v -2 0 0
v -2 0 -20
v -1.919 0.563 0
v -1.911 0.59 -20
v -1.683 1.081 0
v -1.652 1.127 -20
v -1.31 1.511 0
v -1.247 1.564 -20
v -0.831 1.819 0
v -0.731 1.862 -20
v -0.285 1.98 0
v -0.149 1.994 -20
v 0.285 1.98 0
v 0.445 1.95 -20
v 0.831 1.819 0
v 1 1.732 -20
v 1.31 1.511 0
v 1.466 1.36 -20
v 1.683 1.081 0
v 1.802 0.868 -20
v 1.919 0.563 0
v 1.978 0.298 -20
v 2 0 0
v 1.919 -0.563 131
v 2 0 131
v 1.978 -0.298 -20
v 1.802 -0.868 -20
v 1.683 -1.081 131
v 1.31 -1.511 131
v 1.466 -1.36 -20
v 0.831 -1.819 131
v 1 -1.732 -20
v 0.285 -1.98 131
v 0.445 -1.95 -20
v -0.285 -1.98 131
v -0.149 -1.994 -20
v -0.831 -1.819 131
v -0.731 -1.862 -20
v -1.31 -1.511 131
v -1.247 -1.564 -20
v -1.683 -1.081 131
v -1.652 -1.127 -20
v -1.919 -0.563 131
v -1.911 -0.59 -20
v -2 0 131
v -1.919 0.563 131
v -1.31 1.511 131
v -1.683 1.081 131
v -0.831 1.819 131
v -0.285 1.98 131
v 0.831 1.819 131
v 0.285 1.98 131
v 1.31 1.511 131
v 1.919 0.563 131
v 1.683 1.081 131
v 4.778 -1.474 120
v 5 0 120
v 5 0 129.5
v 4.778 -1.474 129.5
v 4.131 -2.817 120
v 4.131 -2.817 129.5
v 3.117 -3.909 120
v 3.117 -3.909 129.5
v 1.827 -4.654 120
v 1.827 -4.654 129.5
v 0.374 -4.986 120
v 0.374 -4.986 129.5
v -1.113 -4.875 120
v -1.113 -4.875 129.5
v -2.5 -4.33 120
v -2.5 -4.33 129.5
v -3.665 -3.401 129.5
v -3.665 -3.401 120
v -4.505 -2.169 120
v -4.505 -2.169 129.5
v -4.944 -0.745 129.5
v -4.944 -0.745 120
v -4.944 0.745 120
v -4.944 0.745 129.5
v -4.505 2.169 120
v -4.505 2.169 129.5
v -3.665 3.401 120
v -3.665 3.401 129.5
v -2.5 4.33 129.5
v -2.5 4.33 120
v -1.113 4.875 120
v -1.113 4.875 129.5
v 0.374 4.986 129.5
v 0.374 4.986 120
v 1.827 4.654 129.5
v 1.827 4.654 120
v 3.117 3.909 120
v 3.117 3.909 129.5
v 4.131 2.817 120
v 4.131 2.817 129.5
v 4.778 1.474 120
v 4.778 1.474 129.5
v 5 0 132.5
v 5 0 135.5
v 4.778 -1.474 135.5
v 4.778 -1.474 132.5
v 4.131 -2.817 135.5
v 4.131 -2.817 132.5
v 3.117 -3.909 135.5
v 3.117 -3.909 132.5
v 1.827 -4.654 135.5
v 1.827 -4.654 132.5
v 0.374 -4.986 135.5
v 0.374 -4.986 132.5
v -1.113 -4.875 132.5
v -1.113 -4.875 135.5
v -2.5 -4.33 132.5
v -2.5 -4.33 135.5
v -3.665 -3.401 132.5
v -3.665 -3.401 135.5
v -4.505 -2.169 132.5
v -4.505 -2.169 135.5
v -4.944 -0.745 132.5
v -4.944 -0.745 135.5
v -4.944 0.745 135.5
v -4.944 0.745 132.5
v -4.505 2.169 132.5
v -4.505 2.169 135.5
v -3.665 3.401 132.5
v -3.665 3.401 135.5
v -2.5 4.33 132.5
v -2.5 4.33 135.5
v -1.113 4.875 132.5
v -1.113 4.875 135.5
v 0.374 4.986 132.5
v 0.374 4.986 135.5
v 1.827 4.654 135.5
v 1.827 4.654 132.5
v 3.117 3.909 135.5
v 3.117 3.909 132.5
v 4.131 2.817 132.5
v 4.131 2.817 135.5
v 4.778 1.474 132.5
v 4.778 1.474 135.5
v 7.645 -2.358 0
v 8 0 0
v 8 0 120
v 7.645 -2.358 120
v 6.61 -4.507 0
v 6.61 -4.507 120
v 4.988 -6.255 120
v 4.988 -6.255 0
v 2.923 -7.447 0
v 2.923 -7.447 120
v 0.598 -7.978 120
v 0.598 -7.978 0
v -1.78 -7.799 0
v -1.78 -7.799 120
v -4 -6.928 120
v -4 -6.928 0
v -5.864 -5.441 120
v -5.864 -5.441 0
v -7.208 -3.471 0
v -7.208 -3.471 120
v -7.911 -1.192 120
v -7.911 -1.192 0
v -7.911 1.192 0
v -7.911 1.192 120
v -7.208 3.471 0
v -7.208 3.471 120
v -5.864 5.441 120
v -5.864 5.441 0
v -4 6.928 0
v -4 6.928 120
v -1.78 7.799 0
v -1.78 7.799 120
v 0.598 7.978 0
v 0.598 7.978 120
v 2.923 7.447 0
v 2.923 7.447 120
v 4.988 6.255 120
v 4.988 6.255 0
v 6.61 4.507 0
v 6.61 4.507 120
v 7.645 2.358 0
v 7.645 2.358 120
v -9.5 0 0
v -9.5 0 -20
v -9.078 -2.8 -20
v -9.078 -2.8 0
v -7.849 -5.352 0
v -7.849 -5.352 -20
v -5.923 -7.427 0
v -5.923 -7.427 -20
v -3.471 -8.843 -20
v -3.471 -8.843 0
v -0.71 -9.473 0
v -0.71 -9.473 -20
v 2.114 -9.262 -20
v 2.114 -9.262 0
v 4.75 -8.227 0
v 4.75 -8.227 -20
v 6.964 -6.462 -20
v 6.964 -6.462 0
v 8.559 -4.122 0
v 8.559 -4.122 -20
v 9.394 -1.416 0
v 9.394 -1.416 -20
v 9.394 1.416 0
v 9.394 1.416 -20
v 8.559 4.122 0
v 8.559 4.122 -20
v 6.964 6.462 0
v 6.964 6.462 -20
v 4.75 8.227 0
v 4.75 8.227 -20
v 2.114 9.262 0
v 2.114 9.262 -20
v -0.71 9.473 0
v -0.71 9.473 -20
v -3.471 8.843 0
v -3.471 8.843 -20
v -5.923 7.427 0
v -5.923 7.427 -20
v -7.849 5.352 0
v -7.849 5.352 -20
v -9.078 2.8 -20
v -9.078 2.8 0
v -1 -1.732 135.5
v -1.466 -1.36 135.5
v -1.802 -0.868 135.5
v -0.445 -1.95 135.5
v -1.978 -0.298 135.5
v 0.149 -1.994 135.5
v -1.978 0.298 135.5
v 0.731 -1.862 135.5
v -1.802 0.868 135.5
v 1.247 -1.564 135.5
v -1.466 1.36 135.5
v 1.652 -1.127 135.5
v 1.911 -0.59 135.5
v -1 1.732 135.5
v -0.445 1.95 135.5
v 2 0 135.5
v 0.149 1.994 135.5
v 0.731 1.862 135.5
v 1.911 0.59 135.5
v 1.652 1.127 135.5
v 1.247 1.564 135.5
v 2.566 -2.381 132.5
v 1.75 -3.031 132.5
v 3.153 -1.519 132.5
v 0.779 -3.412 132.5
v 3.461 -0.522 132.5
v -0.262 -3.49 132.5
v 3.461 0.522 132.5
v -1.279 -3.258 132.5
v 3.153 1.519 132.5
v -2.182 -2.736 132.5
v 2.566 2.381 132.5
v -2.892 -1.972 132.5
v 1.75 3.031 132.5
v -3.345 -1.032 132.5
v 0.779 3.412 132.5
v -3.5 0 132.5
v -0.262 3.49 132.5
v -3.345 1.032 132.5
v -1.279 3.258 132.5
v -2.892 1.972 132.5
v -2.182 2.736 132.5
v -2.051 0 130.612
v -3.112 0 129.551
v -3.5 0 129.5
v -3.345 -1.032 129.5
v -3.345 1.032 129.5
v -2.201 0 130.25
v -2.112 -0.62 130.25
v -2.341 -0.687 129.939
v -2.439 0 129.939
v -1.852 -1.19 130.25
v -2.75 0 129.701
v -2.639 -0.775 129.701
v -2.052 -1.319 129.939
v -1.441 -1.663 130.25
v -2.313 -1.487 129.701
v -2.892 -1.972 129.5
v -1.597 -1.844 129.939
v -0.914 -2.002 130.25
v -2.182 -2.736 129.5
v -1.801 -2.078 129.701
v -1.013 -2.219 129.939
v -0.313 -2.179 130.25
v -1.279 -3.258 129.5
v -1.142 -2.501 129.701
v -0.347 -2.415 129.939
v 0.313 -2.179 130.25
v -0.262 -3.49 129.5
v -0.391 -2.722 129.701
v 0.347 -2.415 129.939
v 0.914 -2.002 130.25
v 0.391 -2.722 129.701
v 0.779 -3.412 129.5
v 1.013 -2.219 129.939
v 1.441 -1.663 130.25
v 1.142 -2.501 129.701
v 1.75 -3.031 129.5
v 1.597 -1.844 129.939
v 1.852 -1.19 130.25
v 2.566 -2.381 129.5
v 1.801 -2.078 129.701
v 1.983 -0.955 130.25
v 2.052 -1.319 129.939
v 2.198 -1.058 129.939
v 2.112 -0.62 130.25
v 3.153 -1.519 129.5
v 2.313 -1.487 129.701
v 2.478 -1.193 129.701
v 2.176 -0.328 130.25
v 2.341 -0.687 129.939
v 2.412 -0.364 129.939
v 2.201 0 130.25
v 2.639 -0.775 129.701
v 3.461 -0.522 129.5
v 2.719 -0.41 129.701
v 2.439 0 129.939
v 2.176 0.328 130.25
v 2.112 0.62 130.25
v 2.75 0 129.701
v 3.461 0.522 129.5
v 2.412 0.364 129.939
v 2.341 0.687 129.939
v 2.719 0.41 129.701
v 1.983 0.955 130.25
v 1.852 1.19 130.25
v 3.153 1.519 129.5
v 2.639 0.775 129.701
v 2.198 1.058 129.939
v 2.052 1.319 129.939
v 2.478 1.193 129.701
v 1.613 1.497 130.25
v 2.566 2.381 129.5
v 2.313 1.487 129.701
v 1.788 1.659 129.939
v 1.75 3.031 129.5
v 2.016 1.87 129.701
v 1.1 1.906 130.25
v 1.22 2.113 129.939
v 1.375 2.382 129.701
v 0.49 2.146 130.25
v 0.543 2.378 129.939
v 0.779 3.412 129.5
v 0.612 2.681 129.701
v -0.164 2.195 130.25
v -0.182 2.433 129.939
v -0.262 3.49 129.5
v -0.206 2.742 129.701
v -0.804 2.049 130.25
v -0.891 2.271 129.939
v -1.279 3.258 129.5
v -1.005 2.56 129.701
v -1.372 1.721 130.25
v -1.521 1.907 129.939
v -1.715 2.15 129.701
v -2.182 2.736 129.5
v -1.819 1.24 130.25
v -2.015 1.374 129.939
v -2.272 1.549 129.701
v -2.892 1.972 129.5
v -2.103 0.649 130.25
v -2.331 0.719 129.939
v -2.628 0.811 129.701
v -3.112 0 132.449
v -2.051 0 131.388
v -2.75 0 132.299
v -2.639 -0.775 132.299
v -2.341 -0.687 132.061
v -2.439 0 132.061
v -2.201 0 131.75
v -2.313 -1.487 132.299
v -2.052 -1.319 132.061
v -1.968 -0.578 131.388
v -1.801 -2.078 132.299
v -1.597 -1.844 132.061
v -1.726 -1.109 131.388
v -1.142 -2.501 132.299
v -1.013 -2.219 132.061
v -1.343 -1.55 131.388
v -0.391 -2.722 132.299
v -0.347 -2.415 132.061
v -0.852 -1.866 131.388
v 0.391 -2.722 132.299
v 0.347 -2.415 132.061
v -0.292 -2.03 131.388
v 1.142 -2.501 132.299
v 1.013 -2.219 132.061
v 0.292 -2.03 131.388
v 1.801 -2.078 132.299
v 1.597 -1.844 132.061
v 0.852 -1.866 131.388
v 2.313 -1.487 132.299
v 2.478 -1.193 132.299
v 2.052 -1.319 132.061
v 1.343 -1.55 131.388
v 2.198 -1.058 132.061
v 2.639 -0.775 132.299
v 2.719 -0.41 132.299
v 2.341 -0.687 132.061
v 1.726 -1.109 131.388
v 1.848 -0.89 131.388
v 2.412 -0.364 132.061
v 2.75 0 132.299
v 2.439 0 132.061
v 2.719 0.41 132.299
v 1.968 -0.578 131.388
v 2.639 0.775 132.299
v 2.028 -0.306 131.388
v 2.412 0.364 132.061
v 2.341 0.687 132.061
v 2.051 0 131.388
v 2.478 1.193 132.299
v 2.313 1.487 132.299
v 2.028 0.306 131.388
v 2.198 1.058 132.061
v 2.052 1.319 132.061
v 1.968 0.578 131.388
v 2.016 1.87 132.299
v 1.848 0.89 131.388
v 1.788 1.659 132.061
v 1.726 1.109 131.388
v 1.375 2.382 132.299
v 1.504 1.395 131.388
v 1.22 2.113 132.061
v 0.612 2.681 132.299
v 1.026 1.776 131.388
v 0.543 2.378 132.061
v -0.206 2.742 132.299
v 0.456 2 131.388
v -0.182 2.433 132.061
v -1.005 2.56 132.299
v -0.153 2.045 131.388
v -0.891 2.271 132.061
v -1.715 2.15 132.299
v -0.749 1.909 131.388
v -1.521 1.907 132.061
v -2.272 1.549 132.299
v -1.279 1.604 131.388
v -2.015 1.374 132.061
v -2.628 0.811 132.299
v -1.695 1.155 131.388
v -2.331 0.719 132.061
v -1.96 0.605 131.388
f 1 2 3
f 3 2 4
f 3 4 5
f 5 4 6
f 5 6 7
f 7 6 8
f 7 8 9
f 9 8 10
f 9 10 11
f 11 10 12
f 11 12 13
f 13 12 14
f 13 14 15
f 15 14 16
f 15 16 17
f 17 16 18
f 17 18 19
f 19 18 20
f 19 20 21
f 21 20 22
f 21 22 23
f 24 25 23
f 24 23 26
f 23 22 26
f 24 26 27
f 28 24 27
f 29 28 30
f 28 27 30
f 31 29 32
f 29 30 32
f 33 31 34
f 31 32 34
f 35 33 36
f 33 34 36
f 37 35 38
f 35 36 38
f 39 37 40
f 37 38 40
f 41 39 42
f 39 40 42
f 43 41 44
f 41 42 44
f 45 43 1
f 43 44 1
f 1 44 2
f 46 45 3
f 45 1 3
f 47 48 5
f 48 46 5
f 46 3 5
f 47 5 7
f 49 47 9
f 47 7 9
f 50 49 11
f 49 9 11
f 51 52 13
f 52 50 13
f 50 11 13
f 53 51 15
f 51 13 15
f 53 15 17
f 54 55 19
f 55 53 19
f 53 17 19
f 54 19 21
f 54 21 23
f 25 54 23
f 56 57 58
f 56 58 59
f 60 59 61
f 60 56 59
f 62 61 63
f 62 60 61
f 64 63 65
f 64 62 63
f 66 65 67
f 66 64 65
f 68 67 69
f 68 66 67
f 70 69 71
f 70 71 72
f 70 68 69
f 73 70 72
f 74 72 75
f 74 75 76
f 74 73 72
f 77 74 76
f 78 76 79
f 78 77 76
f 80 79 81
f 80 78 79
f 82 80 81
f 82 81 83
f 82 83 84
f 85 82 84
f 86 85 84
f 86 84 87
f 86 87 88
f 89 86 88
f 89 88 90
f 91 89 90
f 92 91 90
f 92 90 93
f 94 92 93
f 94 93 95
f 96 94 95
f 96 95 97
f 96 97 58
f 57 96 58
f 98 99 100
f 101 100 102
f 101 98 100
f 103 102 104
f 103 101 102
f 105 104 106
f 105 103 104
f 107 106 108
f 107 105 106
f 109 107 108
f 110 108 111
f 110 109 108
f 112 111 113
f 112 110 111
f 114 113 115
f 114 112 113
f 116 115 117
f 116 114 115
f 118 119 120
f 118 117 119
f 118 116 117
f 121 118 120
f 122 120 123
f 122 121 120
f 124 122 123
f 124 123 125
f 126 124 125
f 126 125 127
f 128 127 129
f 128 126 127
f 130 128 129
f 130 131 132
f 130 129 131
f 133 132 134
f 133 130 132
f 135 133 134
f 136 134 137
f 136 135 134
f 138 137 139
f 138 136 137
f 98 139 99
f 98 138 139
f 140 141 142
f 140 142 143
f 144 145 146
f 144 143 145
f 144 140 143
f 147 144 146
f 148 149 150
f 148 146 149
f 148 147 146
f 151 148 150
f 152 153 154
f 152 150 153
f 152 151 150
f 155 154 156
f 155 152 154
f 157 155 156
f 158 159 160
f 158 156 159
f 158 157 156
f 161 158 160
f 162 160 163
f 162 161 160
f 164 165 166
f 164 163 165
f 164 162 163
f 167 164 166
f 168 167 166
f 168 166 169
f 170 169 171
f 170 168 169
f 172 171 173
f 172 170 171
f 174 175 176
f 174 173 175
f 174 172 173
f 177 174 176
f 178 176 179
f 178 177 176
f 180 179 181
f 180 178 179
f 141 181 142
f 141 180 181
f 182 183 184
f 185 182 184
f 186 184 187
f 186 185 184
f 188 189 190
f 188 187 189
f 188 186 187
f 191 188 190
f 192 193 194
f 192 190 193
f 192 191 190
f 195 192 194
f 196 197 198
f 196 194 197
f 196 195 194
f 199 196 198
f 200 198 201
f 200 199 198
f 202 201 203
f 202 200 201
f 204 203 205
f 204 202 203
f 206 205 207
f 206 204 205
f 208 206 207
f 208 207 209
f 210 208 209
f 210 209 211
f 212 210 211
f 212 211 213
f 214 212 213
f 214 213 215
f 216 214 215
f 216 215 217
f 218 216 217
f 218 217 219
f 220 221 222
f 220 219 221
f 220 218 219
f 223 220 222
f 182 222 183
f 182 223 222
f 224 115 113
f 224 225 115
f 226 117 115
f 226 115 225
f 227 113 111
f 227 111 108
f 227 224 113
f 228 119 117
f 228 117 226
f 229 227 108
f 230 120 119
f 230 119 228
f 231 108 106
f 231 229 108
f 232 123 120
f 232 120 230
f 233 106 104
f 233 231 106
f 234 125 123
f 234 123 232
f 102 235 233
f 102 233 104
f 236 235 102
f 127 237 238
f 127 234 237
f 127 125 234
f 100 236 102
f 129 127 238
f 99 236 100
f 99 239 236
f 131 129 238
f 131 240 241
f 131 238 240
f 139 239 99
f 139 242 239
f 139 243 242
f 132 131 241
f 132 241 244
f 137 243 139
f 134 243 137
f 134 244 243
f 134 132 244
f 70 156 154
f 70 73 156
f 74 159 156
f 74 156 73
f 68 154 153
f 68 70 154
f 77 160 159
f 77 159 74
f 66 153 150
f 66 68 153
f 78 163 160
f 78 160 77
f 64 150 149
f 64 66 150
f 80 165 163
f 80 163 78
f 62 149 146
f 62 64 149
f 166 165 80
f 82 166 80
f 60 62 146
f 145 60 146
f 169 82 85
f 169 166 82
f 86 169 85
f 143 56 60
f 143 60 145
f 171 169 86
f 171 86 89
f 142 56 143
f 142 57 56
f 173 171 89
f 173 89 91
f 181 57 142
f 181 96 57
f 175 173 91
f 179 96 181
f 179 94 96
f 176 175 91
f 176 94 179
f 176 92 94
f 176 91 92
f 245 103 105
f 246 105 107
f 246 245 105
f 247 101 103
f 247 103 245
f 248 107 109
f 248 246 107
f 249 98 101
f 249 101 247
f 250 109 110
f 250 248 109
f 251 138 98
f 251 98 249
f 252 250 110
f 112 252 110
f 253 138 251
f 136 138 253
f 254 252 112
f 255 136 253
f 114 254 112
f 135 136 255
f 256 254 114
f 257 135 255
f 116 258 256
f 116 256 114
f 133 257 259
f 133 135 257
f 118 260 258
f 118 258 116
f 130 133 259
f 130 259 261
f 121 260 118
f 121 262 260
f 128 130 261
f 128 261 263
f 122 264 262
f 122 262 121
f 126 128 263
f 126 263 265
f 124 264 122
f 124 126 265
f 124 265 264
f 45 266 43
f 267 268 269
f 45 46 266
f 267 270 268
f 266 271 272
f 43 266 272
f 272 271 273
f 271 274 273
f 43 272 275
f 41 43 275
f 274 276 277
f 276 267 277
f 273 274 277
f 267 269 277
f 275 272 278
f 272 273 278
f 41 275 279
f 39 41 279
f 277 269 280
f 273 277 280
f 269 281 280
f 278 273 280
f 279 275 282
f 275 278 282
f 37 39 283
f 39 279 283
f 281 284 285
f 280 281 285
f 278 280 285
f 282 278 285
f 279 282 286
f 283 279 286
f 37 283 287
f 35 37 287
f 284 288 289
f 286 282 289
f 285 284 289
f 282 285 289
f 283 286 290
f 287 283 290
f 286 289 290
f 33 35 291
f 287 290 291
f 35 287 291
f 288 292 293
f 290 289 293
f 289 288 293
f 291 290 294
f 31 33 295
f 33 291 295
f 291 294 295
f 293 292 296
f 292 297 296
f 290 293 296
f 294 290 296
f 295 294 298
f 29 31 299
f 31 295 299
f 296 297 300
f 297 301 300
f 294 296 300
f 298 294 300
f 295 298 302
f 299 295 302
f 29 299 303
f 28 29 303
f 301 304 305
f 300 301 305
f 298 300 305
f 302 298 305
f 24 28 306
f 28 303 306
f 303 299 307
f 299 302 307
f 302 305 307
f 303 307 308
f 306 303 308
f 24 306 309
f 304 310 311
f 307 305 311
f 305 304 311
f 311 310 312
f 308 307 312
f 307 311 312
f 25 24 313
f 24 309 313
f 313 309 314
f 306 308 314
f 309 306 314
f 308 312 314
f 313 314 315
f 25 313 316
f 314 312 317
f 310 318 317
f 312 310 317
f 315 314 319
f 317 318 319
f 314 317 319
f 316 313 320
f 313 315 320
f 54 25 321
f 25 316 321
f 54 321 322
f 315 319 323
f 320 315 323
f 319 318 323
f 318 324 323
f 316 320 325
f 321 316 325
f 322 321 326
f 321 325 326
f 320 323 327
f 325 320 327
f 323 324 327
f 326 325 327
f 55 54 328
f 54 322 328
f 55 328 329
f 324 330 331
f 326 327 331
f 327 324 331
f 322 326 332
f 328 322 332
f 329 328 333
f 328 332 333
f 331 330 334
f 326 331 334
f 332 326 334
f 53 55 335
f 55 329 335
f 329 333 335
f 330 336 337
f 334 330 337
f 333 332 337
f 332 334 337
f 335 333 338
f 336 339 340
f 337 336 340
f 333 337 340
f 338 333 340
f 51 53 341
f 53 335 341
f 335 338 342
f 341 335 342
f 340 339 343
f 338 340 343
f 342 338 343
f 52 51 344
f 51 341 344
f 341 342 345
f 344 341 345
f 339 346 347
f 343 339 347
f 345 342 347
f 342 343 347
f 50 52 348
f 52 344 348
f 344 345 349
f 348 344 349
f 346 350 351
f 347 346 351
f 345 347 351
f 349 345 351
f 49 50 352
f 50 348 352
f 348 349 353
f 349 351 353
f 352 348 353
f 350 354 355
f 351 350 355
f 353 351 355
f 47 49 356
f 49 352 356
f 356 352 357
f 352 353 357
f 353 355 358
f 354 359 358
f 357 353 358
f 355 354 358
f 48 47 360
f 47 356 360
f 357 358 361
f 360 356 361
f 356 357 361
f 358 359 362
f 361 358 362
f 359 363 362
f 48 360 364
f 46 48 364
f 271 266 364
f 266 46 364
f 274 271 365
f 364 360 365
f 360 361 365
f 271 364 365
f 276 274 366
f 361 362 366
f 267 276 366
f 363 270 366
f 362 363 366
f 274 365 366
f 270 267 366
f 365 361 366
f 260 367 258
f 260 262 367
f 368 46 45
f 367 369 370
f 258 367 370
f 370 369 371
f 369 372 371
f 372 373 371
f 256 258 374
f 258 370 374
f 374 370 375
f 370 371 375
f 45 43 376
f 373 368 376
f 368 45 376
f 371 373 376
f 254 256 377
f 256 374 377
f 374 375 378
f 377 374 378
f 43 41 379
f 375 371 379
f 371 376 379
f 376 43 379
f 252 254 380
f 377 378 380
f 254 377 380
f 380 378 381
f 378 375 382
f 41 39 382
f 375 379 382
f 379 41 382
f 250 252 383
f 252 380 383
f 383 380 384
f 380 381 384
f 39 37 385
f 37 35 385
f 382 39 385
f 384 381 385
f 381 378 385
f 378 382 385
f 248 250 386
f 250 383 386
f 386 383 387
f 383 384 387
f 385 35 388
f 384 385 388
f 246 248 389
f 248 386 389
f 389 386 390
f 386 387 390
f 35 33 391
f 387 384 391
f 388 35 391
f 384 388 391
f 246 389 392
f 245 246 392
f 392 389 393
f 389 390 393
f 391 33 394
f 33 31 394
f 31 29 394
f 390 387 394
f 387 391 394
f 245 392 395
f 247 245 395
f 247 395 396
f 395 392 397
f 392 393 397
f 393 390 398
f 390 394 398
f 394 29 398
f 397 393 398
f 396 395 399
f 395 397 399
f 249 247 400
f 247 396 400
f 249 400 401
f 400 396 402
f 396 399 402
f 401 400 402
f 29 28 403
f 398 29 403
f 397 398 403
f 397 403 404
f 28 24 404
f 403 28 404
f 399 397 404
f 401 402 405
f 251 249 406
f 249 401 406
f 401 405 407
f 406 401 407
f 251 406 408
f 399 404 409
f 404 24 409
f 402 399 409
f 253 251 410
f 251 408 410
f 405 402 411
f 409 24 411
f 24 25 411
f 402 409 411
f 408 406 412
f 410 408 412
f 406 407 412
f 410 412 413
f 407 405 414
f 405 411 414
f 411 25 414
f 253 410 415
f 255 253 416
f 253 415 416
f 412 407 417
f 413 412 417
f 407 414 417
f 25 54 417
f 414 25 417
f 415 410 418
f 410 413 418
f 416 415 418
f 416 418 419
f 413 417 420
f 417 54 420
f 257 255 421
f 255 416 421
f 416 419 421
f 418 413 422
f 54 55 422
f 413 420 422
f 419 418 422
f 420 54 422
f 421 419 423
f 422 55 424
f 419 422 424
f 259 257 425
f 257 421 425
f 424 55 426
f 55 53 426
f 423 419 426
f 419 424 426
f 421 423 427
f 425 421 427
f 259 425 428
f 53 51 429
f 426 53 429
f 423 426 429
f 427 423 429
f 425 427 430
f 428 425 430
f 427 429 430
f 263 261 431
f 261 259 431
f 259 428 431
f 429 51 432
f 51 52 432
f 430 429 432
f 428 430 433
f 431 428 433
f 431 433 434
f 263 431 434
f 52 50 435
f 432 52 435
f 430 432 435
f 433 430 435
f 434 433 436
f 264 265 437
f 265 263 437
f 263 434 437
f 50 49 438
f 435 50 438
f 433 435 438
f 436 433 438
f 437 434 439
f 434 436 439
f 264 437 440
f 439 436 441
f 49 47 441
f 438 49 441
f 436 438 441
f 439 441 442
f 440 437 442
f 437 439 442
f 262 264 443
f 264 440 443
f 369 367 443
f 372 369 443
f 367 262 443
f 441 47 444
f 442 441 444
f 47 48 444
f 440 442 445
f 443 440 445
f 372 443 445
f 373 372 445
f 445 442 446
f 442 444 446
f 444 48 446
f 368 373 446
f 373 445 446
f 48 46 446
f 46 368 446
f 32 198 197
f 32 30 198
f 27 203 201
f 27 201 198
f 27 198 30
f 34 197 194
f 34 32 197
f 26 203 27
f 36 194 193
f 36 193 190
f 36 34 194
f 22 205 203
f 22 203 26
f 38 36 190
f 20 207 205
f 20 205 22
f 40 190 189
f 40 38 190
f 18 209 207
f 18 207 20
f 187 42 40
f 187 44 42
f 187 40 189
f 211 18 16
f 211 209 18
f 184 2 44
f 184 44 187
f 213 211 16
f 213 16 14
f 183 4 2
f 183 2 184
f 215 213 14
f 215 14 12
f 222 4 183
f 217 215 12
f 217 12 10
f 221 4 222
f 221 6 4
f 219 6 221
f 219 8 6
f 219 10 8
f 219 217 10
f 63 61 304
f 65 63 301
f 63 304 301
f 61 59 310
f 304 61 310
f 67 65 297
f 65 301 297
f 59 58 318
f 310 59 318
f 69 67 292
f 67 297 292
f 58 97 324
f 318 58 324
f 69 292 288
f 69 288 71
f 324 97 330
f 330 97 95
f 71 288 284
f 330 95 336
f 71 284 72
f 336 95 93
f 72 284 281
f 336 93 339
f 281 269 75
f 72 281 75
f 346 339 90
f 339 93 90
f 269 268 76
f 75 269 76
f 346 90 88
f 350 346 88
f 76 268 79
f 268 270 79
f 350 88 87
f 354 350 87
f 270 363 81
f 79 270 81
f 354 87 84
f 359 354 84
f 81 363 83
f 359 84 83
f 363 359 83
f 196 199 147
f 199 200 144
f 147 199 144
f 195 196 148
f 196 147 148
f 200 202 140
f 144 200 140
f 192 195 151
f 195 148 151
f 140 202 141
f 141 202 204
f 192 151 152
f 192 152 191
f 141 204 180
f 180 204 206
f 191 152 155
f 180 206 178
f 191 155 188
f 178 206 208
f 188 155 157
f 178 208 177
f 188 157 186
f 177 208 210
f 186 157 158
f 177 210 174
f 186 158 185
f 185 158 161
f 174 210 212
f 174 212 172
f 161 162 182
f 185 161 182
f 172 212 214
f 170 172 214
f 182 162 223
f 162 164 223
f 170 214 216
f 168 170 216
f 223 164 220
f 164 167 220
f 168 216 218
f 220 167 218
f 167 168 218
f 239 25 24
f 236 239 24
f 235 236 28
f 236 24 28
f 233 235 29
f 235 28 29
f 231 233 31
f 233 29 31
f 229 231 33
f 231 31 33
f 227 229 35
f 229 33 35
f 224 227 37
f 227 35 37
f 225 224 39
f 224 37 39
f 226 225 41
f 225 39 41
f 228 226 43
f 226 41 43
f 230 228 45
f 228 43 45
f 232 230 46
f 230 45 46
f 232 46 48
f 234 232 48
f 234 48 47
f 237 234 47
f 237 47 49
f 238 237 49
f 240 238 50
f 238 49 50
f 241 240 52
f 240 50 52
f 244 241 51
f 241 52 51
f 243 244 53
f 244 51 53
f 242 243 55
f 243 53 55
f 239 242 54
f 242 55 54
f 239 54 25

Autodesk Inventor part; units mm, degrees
ref_plane "YZ Plane" through (0, 0, 0) normal (1, 0, 0) x (0, 1, 0)
ref_plane "XZ Plane" through (0, 0, 0) normal (0, 1, 0) x (-1, 0, 0)
sketch "Sketch1" plane through (0, 0, 0) normal (0, 0, 1) x (1, 0, 0)
  circle A0 centre (0, 0) radius 8
  dimension "d0" = 16
extrude "Extrusion1" add sketch "Sketch1" along normal blind 120
sketch "Sketch2" plane through (0, 0, 120) normal (0, 0, 1) x (1, 0, 0)
  circle A0 centre (0, 0) radius 5
  dimension "d3" = 10
extrude "Extrusion2" add sketch "Sketch2" along normal blind 9.5
sketch "Sketch5" plane through (0, 0, 129.5) normal (0, 0, 1) x (1, 0, 0)
  circle A0 centre (0, 0) radius 5
extrude "Extrusion4" add sketch "Sketch5" along normal blind 6
sketch "Sketch8" plane through (0, 0, 135.5) normal (0, 0, 1) x (1, 0, 0)
  circle A0 centre (0, 0) radius 5 projected
  circle A1 centre (0, 0) radius 2
  dimension "d27" = 4
extrude "Extrusion7" cut sketch "Sketch8" against normal blind 189 contours A1
sketch "Sketch10" plane through (0, 0, 0) normal (0, 0, -1) x (-1, 0, 0)
  circle A0 centre (0, 0) radius 2 projected
  circle A1 centre (0, 0) radius 9.5
  dimension "d44" = 19
extrude "Extrusion9" add sketch "Sketch10" along normal blind 20 contours A0 | A1
sketch "Sketch11" plane through (0, 0, -20) normal (0, 0, -1) x (-1, 0, 0)
  circle A0 centre (0, 0) radius 2 projected
  circle A1 centre (0, 0) radius 2
extrude "Extrusion10" cut sketch "Sketch11" against normal blind 20
sketch "Sketch12" plane through (0, 0, 135.5) normal (0, 0, 1) x (1, 0, 0)
  circle A0 centre (0, 0) radius 5 projected
  point P0 (5, 0)
ref_plane "Work Plane1" through (5, 0, 135.5) normal (0, 1, 0) x (-1, 0, 0)
sketch "Sketch14" plane through (5, 0, 135.5) normal (0, 1, 0) x (-1, 0, 0)
  point P0 (5, -135.5)
sketch "Sketch15" plane through (5, 0, 135.5) normal (0, 1, 0) x (-1, 0, 0)
  arc A0 (8.5, -3) -> (8.5, -6) centre (8.5, -4.5) ccw
  line L0 (13, -15.5) -> (-3, -15.5) projected
  line L1 (5, -186.6) -> (5, 31.1) projected
  line L2 (8.5, -6) -> (10, -6)
  line L3 (8.5, -3) -> (10, -3)
  line L4 (10, -15.5) -> (10, 0) projected
  line L5 (10, -3) -> (10, -6)
  point P0 (5, -135.5)
  point P1 (10, -6)
  dimension "d67" = 3
  dimension "d68" = 11
  dimension "d69" = 3.5
revolve "Revolution2" cut sketch "Sketch15" angle 360 about axis through (0, 0, 120) along (0, 0, -1)
thread "Thread1" size "M16x2" class "6g" standard "ANSI Metric M Profile" full length
properties part number "Trapezspindle"
